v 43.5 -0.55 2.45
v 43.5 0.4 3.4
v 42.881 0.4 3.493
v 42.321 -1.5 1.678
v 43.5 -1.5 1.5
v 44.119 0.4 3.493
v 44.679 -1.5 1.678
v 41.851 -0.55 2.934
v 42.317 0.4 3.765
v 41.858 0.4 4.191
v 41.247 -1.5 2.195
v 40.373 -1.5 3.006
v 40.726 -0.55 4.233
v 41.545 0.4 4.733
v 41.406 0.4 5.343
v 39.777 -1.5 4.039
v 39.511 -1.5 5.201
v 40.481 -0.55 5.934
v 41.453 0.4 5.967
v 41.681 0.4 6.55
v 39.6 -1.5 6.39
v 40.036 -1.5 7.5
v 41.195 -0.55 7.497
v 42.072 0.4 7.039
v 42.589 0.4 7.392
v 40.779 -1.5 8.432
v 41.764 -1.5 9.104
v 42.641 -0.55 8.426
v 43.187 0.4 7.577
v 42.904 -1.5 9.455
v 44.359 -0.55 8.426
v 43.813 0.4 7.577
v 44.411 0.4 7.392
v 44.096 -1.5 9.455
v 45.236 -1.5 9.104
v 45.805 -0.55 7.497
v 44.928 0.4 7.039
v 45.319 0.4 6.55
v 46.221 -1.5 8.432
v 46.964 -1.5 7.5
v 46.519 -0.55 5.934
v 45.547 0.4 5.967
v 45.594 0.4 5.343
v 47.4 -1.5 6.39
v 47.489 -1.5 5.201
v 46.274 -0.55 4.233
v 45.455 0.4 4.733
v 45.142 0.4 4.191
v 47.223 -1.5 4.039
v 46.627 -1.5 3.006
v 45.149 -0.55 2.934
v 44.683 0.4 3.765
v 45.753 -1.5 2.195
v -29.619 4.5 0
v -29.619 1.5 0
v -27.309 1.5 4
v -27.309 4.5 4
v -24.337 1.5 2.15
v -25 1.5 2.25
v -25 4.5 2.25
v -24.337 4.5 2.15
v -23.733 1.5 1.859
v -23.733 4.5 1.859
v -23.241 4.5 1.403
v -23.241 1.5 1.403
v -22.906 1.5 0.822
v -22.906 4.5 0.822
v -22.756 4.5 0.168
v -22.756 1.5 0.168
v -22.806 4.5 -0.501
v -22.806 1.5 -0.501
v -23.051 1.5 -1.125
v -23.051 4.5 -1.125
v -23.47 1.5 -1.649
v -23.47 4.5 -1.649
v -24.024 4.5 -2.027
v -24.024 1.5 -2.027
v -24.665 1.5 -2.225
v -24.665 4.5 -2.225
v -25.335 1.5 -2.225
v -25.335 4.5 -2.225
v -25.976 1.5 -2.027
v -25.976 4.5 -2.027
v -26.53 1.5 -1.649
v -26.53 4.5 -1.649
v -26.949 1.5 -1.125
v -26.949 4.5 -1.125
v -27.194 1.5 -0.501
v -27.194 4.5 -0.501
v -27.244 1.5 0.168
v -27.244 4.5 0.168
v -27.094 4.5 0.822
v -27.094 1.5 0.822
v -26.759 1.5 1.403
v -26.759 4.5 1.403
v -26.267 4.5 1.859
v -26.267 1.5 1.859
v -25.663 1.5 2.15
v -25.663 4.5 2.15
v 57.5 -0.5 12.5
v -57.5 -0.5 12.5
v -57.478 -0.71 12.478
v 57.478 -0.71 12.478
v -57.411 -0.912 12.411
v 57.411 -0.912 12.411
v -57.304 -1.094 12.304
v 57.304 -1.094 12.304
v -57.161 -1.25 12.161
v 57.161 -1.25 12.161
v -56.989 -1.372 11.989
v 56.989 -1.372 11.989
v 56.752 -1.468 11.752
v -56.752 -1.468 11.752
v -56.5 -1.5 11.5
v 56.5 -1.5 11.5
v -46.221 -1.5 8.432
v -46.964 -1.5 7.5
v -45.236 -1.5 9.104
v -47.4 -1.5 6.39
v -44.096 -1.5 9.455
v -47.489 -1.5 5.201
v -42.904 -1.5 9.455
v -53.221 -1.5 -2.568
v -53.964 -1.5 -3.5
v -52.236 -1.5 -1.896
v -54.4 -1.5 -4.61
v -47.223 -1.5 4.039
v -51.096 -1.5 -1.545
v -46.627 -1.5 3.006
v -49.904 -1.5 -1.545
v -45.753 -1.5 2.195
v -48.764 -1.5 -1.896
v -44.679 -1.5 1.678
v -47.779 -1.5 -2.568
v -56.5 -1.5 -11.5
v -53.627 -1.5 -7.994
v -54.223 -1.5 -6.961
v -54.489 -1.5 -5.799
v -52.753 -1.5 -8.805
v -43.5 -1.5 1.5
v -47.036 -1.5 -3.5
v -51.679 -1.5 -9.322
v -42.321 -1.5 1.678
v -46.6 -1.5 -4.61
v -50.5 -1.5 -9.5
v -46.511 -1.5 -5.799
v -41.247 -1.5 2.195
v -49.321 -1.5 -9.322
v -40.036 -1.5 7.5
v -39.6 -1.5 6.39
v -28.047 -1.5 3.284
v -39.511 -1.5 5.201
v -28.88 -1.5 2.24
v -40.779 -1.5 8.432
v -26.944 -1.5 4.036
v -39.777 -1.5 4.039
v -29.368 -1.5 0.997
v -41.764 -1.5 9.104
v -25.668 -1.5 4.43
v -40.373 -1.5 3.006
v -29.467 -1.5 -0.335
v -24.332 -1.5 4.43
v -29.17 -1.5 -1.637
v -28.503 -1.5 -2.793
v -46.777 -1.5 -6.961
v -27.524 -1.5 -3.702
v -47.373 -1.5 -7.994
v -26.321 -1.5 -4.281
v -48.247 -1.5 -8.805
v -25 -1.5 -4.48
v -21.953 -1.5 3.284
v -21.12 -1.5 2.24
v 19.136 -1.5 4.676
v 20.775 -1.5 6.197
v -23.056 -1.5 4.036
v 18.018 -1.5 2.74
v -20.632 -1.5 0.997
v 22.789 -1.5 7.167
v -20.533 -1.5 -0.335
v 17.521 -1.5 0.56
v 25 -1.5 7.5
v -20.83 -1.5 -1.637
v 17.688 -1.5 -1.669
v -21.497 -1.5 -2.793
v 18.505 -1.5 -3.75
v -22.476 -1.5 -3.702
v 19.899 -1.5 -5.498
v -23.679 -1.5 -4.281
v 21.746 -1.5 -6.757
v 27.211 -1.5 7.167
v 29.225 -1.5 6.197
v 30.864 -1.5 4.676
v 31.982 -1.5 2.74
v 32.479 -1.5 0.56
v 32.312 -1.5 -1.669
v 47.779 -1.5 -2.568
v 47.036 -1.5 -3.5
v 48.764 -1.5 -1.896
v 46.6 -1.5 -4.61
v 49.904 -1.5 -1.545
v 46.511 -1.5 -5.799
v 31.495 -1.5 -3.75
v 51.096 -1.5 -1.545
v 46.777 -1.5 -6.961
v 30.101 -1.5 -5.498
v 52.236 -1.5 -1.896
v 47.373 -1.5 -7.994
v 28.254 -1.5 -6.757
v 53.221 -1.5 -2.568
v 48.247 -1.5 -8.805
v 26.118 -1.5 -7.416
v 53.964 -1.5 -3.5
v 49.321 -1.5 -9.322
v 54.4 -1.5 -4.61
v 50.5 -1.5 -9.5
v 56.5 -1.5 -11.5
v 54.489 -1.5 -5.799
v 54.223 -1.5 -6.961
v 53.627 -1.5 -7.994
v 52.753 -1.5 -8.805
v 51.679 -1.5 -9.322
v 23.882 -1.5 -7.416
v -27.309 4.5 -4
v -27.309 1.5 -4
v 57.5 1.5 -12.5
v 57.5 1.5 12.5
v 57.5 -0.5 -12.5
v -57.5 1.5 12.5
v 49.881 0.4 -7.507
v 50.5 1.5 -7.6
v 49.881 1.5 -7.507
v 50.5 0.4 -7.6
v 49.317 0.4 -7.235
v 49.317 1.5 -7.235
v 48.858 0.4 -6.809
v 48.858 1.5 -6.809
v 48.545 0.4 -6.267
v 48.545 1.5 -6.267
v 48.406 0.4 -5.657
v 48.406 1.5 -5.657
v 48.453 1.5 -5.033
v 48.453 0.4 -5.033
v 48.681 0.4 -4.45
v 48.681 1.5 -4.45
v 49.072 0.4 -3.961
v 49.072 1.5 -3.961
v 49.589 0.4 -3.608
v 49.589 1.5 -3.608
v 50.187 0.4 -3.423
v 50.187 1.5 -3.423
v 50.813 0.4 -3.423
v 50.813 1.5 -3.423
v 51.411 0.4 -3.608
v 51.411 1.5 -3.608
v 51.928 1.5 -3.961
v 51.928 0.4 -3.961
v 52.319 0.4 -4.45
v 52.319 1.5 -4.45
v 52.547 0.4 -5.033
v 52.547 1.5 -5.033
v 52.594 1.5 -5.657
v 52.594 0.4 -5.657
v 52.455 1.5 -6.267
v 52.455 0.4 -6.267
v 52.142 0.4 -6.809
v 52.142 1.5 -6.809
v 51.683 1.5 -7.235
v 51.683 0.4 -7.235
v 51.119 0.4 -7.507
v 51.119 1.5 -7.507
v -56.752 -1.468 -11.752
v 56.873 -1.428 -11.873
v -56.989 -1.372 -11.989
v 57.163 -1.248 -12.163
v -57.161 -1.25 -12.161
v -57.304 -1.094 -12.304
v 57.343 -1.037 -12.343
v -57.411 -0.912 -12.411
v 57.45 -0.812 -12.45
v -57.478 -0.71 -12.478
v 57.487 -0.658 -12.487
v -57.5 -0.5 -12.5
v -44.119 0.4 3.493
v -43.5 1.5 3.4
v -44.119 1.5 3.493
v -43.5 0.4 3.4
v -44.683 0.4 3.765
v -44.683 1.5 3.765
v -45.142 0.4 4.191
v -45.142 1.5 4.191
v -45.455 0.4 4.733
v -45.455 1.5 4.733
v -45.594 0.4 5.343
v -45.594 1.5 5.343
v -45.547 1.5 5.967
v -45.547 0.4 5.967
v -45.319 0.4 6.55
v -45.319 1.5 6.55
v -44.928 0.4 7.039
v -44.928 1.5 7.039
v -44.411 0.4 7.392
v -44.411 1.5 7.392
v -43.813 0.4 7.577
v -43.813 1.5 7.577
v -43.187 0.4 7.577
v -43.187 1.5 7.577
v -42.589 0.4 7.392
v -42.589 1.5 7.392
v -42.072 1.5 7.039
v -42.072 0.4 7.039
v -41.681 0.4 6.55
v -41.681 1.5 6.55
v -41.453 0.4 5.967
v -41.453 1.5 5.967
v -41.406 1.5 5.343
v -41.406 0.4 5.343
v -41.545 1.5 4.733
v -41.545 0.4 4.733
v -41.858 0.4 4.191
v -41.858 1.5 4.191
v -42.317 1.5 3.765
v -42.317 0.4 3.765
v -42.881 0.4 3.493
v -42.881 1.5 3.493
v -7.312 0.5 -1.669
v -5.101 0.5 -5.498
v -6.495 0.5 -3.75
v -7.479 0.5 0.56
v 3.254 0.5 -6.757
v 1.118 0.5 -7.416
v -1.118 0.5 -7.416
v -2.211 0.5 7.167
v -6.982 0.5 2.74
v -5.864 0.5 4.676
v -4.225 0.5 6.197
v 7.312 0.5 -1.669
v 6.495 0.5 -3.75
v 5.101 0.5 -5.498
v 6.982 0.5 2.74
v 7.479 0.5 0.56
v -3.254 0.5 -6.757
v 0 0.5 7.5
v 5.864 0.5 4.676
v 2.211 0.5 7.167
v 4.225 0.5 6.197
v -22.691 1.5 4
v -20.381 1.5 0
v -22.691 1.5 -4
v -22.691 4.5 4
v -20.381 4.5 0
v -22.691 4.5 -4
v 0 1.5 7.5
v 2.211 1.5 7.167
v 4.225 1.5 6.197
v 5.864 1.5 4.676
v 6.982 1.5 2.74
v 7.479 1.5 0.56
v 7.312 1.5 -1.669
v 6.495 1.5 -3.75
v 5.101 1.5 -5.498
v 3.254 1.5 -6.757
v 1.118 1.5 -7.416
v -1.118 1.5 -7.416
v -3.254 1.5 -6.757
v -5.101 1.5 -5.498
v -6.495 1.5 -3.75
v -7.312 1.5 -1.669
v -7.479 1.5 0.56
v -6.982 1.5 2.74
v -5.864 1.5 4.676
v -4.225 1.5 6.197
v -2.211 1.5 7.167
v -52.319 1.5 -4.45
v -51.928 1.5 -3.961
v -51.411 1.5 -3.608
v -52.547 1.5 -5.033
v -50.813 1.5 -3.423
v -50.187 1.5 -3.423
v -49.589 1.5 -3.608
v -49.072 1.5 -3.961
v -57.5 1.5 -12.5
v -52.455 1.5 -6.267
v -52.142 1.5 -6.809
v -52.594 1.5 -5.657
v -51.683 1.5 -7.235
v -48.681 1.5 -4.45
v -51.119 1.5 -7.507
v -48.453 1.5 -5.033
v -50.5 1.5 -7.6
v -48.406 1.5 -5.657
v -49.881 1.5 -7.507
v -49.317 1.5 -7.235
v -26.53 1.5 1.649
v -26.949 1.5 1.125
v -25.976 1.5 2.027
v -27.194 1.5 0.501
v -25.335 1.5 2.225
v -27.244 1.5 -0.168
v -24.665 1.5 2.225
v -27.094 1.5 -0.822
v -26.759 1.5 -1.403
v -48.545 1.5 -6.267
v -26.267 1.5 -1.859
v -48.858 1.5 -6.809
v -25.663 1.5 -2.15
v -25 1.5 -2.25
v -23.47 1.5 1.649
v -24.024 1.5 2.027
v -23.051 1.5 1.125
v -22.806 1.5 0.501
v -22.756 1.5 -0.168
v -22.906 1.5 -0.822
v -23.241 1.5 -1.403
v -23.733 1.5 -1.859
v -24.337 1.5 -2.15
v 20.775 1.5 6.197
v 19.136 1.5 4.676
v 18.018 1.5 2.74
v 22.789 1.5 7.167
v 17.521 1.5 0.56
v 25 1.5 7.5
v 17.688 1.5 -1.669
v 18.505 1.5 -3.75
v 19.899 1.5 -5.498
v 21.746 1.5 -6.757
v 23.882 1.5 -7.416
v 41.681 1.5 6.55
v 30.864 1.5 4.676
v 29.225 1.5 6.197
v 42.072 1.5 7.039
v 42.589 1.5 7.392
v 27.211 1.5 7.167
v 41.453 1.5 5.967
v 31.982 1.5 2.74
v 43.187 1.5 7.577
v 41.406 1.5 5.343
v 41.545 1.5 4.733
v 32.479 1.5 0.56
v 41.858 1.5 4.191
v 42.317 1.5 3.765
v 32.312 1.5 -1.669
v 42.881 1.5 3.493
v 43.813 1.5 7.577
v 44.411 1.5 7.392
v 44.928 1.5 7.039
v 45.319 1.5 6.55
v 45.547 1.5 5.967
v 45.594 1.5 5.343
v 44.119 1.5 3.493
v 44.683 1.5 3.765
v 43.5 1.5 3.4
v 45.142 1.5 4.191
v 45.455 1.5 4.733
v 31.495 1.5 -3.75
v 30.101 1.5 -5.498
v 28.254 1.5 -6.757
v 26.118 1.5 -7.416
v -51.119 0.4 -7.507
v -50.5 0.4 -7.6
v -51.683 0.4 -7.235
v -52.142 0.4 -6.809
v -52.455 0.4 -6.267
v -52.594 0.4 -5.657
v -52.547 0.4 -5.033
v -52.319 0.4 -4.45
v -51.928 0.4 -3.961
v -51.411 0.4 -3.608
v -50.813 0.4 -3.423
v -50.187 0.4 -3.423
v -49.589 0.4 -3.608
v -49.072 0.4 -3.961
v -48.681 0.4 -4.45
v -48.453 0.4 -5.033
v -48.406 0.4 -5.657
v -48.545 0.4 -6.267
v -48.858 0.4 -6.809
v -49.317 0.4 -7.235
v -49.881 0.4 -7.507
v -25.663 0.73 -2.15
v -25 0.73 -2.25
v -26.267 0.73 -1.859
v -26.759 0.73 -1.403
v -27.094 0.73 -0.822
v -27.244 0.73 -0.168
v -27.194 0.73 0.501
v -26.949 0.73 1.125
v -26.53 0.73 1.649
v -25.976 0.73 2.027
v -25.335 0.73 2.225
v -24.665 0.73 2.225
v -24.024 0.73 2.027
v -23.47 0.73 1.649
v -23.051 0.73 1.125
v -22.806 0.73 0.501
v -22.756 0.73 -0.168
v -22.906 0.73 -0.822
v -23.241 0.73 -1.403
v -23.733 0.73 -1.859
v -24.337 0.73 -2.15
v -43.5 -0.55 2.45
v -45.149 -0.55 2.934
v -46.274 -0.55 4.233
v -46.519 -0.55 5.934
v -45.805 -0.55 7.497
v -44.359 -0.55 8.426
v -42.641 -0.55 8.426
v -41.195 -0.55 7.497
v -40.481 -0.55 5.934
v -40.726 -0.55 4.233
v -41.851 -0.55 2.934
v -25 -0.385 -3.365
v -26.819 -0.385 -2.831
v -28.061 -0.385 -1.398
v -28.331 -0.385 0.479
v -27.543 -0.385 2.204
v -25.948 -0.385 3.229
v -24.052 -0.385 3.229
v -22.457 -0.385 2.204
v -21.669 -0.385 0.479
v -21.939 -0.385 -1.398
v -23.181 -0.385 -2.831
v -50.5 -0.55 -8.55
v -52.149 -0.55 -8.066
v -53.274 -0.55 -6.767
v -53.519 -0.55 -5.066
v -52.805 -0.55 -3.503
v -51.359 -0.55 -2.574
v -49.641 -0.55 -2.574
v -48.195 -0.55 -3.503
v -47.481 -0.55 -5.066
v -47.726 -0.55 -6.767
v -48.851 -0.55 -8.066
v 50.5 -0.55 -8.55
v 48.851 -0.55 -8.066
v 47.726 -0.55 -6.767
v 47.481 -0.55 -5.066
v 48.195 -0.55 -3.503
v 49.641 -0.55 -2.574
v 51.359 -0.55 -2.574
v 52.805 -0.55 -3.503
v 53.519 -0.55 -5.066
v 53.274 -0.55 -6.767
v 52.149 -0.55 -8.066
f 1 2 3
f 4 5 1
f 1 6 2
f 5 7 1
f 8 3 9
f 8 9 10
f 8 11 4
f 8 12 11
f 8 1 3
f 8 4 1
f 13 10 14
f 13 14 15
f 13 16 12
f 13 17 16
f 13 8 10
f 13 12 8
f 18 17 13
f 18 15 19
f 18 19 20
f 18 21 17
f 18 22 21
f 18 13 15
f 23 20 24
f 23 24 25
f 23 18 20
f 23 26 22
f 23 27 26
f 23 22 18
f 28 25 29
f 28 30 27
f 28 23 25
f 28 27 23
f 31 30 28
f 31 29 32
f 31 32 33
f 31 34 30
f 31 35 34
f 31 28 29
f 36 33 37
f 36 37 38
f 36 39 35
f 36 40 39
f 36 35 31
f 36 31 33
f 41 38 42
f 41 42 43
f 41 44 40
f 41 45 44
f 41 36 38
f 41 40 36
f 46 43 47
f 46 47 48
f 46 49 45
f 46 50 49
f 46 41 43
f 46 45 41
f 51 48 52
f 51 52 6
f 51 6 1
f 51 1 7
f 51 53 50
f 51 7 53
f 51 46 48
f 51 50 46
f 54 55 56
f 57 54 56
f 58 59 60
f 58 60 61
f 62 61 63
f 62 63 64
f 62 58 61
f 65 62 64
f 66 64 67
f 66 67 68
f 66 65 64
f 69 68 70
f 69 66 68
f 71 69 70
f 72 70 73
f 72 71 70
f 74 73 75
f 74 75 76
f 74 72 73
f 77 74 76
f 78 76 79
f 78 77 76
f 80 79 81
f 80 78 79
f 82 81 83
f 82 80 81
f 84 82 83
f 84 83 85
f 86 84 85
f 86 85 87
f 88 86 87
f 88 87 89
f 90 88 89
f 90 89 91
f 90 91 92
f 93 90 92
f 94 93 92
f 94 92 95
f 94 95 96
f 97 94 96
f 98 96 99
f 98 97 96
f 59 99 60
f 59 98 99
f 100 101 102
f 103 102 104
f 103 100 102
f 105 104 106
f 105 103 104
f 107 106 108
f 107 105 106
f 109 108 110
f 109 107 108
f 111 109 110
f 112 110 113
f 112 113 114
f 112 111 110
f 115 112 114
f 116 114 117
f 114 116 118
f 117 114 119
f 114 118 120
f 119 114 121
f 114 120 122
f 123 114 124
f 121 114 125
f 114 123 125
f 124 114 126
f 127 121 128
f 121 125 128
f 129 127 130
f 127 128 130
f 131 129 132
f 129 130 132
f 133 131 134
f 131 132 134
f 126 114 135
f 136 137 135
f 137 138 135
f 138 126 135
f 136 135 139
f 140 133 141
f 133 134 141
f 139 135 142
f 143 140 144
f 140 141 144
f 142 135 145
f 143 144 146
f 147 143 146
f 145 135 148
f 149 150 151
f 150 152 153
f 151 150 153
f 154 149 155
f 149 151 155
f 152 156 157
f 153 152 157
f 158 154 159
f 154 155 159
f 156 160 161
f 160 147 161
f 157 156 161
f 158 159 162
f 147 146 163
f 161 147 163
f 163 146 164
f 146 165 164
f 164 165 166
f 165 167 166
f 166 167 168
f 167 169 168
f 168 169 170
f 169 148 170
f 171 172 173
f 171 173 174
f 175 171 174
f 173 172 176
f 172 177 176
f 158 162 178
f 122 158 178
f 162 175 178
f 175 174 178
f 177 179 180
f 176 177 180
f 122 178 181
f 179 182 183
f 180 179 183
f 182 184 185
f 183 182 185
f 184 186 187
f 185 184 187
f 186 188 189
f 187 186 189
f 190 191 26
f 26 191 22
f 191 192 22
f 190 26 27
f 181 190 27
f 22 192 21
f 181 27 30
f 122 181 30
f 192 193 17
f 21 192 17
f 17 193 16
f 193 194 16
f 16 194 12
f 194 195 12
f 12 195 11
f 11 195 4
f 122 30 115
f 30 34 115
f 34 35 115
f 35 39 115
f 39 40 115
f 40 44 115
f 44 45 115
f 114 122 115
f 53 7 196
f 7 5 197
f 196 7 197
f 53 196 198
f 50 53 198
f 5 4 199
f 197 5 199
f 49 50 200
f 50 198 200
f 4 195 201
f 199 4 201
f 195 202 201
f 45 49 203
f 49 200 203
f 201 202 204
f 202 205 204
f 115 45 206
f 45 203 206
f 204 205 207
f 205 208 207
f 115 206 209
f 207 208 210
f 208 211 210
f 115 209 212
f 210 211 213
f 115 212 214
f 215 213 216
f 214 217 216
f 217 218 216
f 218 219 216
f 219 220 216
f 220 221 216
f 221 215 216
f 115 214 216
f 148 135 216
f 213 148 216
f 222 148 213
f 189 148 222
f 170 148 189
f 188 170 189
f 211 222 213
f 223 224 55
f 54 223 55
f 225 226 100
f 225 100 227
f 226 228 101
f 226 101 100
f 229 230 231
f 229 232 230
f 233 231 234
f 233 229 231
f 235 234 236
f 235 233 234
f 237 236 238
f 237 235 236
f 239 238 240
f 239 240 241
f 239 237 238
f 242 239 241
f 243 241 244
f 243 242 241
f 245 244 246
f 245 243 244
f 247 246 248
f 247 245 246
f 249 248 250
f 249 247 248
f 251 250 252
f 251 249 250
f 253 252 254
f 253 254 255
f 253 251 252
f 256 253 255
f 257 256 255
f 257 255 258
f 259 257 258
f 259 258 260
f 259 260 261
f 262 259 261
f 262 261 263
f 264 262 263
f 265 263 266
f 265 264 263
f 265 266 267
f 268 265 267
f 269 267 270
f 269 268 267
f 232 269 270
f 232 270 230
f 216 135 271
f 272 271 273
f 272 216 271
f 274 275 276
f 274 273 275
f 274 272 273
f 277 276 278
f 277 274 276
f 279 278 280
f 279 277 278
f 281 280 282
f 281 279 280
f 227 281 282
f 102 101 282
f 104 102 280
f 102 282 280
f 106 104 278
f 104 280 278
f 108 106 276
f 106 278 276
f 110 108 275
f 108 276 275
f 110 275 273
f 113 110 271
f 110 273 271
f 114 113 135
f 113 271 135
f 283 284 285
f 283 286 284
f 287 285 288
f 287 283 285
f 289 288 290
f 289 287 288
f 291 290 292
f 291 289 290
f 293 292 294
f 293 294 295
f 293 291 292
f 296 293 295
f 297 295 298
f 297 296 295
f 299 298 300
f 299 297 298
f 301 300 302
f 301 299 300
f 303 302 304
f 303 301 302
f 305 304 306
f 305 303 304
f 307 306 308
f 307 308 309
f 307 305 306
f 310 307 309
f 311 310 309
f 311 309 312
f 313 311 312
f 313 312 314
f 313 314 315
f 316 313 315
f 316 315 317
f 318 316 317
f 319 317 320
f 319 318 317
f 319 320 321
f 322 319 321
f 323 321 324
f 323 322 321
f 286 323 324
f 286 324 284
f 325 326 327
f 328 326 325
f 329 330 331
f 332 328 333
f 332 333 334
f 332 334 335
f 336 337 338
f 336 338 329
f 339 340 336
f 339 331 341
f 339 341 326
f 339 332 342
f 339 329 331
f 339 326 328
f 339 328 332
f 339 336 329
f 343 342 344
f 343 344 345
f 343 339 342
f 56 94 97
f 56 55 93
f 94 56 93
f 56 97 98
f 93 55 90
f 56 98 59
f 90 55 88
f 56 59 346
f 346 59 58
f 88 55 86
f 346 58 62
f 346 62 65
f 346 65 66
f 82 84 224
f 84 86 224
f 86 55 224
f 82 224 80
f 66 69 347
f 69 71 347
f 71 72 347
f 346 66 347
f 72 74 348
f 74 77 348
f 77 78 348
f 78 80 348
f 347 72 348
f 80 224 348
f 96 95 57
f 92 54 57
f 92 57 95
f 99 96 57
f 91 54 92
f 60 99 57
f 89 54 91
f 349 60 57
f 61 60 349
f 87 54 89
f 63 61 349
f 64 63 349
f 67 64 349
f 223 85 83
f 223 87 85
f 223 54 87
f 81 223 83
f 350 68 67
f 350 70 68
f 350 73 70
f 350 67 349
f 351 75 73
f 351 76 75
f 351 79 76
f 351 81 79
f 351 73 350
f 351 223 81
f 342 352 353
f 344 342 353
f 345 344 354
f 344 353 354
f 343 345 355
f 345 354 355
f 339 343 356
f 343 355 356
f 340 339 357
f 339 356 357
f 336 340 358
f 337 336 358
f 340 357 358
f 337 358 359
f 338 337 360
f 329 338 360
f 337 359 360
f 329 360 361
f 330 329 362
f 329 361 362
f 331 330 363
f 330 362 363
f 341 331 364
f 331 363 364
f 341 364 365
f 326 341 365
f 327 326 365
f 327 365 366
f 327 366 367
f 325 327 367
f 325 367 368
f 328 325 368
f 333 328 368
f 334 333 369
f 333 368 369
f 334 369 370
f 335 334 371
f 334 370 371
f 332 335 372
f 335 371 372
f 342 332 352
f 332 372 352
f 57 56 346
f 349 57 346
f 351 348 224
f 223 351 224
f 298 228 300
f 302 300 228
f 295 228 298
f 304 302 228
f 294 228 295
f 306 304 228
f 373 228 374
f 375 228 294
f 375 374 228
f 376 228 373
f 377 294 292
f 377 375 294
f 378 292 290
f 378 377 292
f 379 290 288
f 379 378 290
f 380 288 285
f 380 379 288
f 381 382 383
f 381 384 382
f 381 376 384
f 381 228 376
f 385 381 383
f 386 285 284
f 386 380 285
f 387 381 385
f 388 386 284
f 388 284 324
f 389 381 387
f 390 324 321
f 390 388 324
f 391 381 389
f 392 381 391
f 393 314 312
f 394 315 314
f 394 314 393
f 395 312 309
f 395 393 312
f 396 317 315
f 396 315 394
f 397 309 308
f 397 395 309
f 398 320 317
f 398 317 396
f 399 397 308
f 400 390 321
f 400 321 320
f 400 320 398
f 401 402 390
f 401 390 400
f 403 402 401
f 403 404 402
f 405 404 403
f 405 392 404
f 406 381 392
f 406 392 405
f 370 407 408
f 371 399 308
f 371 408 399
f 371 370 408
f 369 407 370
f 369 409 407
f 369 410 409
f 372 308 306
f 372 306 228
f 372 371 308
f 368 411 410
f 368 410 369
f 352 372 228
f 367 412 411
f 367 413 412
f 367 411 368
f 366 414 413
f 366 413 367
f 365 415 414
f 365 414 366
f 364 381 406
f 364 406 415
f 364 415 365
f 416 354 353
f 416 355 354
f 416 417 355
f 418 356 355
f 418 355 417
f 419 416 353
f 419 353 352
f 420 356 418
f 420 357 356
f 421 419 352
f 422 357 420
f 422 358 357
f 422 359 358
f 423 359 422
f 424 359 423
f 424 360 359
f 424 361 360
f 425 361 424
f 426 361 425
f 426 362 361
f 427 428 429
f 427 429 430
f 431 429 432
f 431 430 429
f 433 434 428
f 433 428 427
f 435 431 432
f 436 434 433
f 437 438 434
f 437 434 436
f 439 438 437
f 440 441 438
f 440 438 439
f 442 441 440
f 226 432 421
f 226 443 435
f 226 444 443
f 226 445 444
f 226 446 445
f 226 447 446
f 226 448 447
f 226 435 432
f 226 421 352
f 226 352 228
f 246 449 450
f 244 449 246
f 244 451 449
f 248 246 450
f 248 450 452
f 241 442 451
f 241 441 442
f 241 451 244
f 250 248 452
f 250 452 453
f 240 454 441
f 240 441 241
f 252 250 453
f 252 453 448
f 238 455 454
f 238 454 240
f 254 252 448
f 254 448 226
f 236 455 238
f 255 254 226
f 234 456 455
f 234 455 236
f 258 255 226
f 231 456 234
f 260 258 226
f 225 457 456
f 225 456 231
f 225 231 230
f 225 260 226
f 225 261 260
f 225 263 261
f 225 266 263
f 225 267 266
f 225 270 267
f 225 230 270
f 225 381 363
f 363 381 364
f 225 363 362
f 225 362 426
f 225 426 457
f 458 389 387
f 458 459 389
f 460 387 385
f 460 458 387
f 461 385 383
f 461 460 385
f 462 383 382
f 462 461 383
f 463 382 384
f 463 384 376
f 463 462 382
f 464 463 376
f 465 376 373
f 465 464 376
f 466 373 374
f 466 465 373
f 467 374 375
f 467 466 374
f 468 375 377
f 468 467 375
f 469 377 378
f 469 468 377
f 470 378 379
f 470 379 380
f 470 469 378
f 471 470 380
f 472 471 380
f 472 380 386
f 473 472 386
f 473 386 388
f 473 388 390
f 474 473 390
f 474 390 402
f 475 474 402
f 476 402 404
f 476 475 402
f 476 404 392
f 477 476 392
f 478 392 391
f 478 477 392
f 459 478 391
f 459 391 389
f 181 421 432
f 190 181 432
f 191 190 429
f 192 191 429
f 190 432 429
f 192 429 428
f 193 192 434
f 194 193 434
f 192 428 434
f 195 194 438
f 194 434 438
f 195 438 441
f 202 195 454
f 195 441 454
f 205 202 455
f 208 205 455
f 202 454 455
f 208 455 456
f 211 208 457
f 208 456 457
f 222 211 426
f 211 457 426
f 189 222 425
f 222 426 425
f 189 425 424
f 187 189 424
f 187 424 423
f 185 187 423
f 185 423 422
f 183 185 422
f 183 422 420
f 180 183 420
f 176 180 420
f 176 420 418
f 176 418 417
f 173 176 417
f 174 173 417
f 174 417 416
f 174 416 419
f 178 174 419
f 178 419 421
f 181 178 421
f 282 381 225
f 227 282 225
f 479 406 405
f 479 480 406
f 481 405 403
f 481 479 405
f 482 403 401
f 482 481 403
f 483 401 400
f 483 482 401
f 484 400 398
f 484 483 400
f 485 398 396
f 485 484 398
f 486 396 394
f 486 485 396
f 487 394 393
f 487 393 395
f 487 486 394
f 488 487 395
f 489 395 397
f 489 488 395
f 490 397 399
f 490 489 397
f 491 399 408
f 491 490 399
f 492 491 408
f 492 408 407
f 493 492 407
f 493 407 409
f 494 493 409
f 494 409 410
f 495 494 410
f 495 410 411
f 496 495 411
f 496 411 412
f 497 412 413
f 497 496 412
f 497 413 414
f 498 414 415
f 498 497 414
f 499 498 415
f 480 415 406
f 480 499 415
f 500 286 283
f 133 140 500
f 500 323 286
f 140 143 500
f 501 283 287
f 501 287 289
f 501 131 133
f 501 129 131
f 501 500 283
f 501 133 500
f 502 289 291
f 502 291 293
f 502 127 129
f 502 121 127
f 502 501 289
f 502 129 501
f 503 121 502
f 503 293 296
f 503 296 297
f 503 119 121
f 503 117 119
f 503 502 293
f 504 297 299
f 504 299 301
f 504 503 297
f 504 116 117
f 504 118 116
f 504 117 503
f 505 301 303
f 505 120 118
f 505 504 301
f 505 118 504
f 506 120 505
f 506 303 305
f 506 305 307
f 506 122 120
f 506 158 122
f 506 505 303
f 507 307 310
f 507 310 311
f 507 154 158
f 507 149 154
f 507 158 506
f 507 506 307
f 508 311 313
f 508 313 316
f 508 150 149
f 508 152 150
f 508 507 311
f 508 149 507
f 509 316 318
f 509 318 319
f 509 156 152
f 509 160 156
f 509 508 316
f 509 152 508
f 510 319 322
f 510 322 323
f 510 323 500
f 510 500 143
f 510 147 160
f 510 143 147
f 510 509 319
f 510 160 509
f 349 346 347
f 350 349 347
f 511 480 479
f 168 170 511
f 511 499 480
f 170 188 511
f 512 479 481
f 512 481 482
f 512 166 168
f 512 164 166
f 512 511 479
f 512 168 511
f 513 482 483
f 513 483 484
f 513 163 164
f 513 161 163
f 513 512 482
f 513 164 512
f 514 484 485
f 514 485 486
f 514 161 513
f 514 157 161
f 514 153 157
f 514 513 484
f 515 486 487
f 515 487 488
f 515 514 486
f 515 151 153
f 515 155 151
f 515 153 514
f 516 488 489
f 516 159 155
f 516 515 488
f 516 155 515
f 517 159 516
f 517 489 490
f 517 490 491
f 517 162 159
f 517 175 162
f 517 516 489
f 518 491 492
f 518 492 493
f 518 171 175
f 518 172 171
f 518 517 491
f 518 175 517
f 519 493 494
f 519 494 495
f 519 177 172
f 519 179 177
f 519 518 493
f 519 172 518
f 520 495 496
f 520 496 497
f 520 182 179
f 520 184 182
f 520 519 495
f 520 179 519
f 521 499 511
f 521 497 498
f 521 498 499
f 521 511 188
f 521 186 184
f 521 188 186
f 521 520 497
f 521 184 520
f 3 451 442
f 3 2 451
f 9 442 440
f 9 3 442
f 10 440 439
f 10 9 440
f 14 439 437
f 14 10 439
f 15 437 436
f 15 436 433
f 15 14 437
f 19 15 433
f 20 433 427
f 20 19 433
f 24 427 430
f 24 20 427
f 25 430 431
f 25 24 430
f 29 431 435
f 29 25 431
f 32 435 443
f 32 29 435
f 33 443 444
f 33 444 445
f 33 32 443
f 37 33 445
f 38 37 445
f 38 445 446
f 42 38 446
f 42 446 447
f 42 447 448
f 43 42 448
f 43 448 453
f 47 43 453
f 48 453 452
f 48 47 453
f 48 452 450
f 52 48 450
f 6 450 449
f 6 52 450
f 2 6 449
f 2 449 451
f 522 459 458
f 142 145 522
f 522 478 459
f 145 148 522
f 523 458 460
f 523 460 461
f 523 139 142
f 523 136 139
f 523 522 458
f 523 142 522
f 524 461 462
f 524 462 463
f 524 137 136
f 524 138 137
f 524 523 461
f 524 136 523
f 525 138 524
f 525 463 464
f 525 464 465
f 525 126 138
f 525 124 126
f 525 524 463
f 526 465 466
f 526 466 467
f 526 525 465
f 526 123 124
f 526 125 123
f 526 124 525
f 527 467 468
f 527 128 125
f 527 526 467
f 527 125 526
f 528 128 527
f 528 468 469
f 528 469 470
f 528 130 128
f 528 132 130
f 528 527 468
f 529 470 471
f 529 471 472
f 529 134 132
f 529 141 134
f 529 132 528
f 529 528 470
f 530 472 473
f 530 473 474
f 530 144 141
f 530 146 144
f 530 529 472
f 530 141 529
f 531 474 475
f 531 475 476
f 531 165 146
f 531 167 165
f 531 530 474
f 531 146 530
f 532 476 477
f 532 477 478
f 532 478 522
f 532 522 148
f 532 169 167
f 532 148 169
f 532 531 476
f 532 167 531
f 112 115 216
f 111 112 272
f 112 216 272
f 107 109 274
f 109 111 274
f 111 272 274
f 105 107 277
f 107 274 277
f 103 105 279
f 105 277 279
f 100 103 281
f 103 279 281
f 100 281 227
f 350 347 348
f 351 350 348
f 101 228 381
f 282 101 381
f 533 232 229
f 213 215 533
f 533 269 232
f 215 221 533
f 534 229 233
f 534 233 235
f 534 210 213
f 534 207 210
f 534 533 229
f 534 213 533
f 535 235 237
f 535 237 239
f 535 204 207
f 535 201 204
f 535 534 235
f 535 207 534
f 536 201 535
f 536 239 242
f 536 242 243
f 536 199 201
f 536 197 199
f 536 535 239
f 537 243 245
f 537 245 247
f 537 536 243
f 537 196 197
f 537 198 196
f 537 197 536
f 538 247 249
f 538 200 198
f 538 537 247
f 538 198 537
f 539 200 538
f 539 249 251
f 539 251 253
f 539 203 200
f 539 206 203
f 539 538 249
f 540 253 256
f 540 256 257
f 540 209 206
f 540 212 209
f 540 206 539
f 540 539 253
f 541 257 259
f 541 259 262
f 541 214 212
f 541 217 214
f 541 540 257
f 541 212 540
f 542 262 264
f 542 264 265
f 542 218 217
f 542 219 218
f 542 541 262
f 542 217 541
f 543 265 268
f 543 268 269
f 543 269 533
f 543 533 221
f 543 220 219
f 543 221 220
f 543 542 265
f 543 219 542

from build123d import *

# Parameters (mm, degrees)
ESBO_O1_W                           = 115
ESBO_O1_H                           = 25
RESSALTO_EXTRUS_O1_DEPTH            = 1.5
ESBO_O2_R                           = 7.5
CORTE_EXTRUS_O1_DEPTH               = 59.919436521
ESBO_O2_3_R                         = 7.5
CORTE_EXTRUS_O2_DEPTH               = 1
ESCAREADO_PARA_SFHCS_M51_AT_2_COUNT = 2
ESCAREADO_PARA_SFHCS_M51_AT_2_PITCH = 13.03840481
ESCAREADO_PARA_SFHCS_M51_AT_3_COUNT = 2
ESCAREADO_PARA_SFHCS_M51_AT_3_PITCH = 94.641428561
ESCAREADO_PARA_SFHCS_M51_AT_4_COUNT = 2
ESCAREADO_PARA_SFHCS_M51_AT_4_PITCH = 101
FILETE1_R                           = 1
ESBO_O7_R                           = 2.25
RESSALTO_EXTRUS_O2_DEPTH            = 3


with BuildPart() as part:
    # Esboço1 → Ressalto-extrusão1 (new, symmetric)
    with BuildSketch(Plane(origin=(0, 0, 0), x_dir=(1, 0, 0), z_dir=(0, 1, 0))):
        Rectangle(ESBO_O1_W, ESBO_O1_H)
    extrude(amount=RESSALTO_EXTRUS_O1_DEPTH, both=True)

    # Esboço2 → Corte-extrusão1 (cut, through all)
    with BuildSketch(Plane(origin=(0, 1.5, 0), x_dir=(1, 0, 0), z_dir=(0, 1, 0))):
        with Locations((25, 0)):
            Circle(ESBO_O2_R)
    extrude(amount=-CORTE_EXTRUS_O1_DEPTH, mode=Mode.SUBTRACT)

    # Esboço2<3> → Corte-extrusão2 (cut)
    with BuildSketch(Plane(origin=(0, 1.5, 0), x_dir=(1, 0, 0), z_dir=(0, 1, 0))):
        Circle(ESBO_O2_3_R)
    extrude(amount=-CORTE_EXTRUS_O2_DEPTH, mode=Mode.SUBTRACT)

    # Esboço4 → Escareado para SFHCS M51 (revolve, cut)
    with BuildSketch(Plane(origin=(50.5, -1.5, -5.5), x_dir=(0, 0, -1), z_dir=(1, 0, 0))):
        Polygon((0, 0), (0, 3), (2.1, 3), (2.1, 1.9), (4, 0), align=None)
    escareado_para_sfhcs_m51 = revolve(axis=Axis((50.5, -7.85, -5.5), (0, 1, 0)), mode=Mode.SUBTRACT)

    # Escareado para SFHCS M51 at 2: Escareado para SFHCS M51 ×2
    with Locations(*[Vector(-0.5368754921931589, 0, 0.8436614877321078) * (i * ESCAREADO_PARA_SFHCS_M51_AT_2_PITCH) for i in range(1, ESCAREADO_PARA_SFHCS_M51_AT_2_COUNT)]):
        add(escareado_para_sfhcs_m51, mode=Mode.SUBTRACT)

    # Escareado para SFHCS M51 at 3: Escareado para SFHCS M51 ×2
    with Locations(*[Vector(-0.9932225393212899, 0, 0.11622816949504457) * (i * ESCAREADO_PARA_SFHCS_M51_AT_3_PITCH) for i in range(1, ESCAREADO_PARA_SFHCS_M51_AT_3_COUNT)]):
        add(escareado_para_sfhcs_m51, mode=Mode.SUBTRACT)

    # Escareado para SFHCS M51 at 4: Escareado para SFHCS M51 ×2
    with Locations(*[(-i * ESCAREADO_PARA_SFHCS_M51_AT_4_PITCH, 0, 0) for i in range(1, ESCAREADO_PARA_SFHCS_M51_AT_4_COUNT)]):
        add(escareado_para_sfhcs_m51, mode=Mode.SUBTRACT)

    # Filete1
    filete1_edges = [part.edges().sort_by_distance(p)[0] for p in [
        (0, -1.5, -12.5),
        (-57.5, -1.5, 0),
        (57.5, -1.5, 0),
        (0, -1.5, 12.5),
    ]]
    fillet(filete1_edges, radius=FILETE1_R)

    # Esboço6 → Escareado para SFHCS M41 (revolve, cut)
    with BuildSketch(Plane(origin=(-25, -1.5, 0), x_dir=(0, 0, -1), z_dir=(1, 0, 0))):
        Polygon((0, 0), (0, 3), (2.25, 3), (2.25, 2.23), (4.48, 0), align=None)
    revolve(axis=Axis((-25, -7.85, 0), (0, 1, 0)), mode=Mode.SUBTRACT)


with BuildPart() as body_2:
    # Esboço7 → Ressalto-extrusão2 (new body)
    with BuildSketch(Plane(origin=(0, 1.5, 0), x_dir=(1, 0, 0), z_dir=(0, 1, 0))):
        Polygon((-22.690598923, -4), (-20.381197846, 0), (-22.690598923, 4), (-27.309401077, 4), (-29.618802154, 0), (-27.309401077, -4), align=None)
        with Locations((-25, 0)):
            Circle(ESBO_O7_R, mode=Mode.SUBTRACT)
    extrude(amount=RESSALTO_EXTRUS_O2_DEPTH)


solid = Compound([part.part, body_2.part])
